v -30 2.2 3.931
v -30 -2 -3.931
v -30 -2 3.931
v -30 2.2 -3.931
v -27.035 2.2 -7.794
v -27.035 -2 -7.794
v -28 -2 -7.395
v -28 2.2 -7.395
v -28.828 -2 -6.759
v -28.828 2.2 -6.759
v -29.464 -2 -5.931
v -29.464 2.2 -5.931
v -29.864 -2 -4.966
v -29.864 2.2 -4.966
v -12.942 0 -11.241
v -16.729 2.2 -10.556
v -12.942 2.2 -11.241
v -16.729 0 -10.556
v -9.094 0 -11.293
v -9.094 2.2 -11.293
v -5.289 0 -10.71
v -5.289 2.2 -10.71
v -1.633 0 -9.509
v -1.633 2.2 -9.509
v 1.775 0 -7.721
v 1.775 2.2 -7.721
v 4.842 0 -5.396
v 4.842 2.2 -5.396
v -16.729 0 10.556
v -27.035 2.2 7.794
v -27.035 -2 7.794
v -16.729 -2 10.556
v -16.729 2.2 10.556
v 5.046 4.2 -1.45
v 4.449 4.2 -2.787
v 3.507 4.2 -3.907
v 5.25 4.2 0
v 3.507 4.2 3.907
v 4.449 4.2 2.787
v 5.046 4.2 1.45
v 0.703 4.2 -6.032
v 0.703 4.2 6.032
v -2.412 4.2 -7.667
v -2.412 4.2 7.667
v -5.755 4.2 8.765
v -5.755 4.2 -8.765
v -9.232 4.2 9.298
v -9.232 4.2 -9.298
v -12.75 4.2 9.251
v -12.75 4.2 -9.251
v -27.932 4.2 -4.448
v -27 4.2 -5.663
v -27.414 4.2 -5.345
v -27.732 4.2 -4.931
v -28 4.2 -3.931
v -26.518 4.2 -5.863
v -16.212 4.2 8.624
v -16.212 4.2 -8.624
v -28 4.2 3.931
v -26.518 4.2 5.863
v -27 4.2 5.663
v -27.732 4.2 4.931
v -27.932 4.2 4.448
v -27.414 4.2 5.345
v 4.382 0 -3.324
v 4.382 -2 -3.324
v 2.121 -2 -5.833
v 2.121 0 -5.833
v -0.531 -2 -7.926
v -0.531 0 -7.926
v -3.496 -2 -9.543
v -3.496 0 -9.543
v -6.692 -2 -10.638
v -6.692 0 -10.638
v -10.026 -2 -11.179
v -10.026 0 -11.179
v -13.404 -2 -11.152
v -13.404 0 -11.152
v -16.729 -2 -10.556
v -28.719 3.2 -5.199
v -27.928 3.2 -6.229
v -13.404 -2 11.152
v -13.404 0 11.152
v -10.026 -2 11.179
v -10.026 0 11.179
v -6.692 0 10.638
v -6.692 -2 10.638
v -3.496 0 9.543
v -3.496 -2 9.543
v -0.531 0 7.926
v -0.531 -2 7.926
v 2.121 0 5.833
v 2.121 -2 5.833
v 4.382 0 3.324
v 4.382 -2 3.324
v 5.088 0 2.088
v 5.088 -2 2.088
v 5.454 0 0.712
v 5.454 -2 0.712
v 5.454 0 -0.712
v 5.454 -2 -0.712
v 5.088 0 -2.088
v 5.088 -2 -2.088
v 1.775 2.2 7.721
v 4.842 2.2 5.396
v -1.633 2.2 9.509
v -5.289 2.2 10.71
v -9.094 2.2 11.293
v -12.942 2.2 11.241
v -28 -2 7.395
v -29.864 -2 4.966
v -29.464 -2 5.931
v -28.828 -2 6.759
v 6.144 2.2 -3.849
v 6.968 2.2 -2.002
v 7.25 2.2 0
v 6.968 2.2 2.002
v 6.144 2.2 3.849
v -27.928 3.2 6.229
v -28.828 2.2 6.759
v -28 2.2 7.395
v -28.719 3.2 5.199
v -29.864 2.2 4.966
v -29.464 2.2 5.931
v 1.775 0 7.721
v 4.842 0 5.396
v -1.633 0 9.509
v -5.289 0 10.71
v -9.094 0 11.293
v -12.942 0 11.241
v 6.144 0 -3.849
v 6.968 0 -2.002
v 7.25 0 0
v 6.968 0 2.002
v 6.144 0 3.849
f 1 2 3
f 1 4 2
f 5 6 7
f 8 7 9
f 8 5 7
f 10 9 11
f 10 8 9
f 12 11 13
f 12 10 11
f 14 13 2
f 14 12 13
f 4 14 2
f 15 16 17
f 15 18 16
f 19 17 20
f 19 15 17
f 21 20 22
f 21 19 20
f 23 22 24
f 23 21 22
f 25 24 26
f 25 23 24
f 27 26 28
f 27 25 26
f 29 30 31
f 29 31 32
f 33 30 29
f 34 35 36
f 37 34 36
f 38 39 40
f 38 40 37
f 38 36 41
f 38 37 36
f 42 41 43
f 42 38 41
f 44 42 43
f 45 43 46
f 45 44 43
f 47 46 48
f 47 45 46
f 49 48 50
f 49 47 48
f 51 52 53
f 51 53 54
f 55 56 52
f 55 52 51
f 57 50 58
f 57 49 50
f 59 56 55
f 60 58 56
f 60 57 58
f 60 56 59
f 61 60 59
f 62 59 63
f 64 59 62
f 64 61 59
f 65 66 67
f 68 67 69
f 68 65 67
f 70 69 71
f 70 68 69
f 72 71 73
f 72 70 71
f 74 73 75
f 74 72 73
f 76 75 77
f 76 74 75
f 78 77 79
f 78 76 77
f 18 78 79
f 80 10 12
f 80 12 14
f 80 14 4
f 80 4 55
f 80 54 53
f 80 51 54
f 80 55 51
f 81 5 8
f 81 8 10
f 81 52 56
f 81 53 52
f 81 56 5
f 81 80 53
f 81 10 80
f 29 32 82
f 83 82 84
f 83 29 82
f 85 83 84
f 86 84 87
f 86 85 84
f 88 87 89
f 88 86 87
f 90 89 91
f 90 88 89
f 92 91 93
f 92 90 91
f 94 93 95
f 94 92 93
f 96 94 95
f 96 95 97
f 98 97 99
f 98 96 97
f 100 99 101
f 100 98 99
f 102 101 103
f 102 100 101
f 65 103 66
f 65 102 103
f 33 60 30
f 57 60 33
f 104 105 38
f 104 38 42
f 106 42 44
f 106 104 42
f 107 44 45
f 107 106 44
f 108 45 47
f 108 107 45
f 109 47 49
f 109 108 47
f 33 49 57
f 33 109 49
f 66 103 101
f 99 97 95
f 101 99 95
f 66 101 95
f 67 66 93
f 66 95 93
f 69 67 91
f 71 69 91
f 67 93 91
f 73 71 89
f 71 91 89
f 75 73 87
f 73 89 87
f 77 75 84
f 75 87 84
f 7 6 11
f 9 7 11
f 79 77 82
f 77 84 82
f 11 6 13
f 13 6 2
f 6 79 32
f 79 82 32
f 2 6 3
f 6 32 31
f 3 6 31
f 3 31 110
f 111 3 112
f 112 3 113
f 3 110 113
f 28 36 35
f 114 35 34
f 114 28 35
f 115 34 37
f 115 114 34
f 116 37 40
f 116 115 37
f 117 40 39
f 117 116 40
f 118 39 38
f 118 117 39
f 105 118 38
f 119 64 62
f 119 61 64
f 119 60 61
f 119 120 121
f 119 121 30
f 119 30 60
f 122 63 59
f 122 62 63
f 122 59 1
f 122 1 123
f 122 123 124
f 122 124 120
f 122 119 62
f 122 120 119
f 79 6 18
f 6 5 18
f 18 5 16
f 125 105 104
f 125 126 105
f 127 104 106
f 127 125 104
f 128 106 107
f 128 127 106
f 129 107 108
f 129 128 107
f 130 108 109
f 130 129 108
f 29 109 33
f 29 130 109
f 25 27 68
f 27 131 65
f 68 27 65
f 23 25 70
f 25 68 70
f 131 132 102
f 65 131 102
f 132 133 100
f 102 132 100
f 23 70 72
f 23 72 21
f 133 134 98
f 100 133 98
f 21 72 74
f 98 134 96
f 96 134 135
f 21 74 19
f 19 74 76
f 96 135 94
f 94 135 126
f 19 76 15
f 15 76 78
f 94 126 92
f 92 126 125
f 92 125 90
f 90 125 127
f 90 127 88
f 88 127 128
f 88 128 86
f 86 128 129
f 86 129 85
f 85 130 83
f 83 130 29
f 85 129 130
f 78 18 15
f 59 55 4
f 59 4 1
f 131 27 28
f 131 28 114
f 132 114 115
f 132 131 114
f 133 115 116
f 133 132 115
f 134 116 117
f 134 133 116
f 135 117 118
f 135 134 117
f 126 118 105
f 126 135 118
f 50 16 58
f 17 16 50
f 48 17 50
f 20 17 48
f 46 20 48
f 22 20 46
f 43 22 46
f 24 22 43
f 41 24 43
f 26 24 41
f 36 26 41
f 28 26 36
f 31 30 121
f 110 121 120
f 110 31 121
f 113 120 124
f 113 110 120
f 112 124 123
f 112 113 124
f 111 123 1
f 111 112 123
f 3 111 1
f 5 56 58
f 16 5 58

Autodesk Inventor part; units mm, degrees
ref_plane "YZ Plane" through (0, 0, 0) normal (1, 0, 0) x (0, 1, 0)
ref_plane "XZ Plane" through (0, 0, 0) normal (0, 1, 0) x (-1, 0, 0)
ref_plane "XY Plane" through (0, 0, 0) normal (0, 0, 1) x (1, 0, 0)
sketch "Sketch1" plane through (0, 0, 0) normal (0, 1, 0) x (-1, 0, 0)
  circle A0 centre (0, 0) radius 5.5
  line L0 (0, 0) -> (30, 0) construction
  line L1 (30, -7) -> (30, 7)
  line L2 (30, -7) -> (16.7292, -10.5559)
  arc A1 (-4.3821, -3.3237) -> (16.7292, -10.5559) centre (11.5528, 8.7626) ccw
  line L3 (30, 7) -> (16.7292, 10.5559)
  arc A2 (16.7292, 10.5559) -> (-4.3821, 3.3237) centre (11.5528, -8.7626) ccw
  circle A3 centre (0, 0) radius 7.25
  arc A4 (16.7292, 10.5559) -> (-4.8424, 5.3957) centre (10.7046, -11.928) ccw
  arc A5 (-4.8424, -5.3957) -> (16.7292, -10.5559) centre (10.7046, 11.928) ccw
  point P0 (1.7838, 5.2027)
  point P1 (1.7838, -5.2027)
  point P2 (16.7292, 10.5559)
  point P3 (30, 9.4853)
  point P4 (30, -9.4853)
  point P5 (30, -9.4752)
  point P6 (30, 9.4752)
  dimension "d0" = 11
  dimension "d1" = 30
  dimension "d2" = 14
  dimension "d5" = 30
  dimension "d10" = 14.5
  dimension "d52" = 20
extrude "Extrusion1" add sketch "Sketch1" against normal blind 2 contours A0 | A0 A2 A3 A1 | A2 L3 L1 L2 A1 A3 picked at (6.6012, -0.5586)
extrude "Extrusion2" add sketch "Sketch1" along normal blind 4.2
fillet "Fillet1" radius 4 2 edges at (-30, 1.1, 7) (-30, 1.1, -7)
chamfer "Chamfer1" distance 2 angle 45 8 edges at (-30, 4.2, 0) (-29.1734, 4.2, 6.3657) (-21.8822, 4.2, 9.1752) (-5.2893, 4.2, 10.7104) (7.25, 4.2, 0) (-5.2893, 4.2, -10.7104) (-21.8822, 4.2, -9.1752) (-29.1734, 4.2, -6.3657)
sketch "Sketch9" plane through (0, -2, 0) normal (0, -1, 0) x (1, 0, 0)
  arc A0 (-27.0353, 7.7944) -> (-30, 3.9307) centre (-26, 3.9307) ccw projected
  line L0 (-30, 3.9307) -> (-30, -3.9307) projected
  arc A1 (-30, -3.9307) -> (-27.0353, -7.7944) centre (-26, -3.9307) ccw projected
  arc A2 (6.1782, -6.8842) -> (6.1782, 6.8842) centre (0, 0) ccw projected
  line L1 (-32, -3.9307) -> (-32, 3.9307) projected
  line L2 (-27.5363, -9.7307) -> (-33.6527, -8.0918)
  arc A3 (-36.9536, -3.79) -> (-33.6527, -8.0918) centre (-32.5, -3.79) ccw
  line L3 (-36.9536, -3.79) -> (-36.9536, 4.2596)
  arc A4 (-33.0372, 8.6806) -> (-36.9536, 4.2596) centre (-32.5, 4.2596) ccw
  line L4 (-32, 3.9307) -> (-32, -3.9307) projected
  line L5 (-26.7661, 9.4426) -> (-33.0372, 8.6806)
  arc A5 (-17.2468, -12.4878) -> (6.1782, -6.8842) centre (-10.7046, 11.928) ccw projected
  line L6 (-26.5589, -7.4525) -> (-33.0176, -5.7218)
  arc A6 (-34.5, -3.79) -> (-33.0176, -5.7218) centre (-32.5, -3.79) ccw
  line L7 (-34.5, -3.79) -> (-34.5, 4.2596)
  arc A7 (-33.0176, 6.1914) -> (-34.5, 4.2596) centre (-32.5, 4.2596) ccw
  line L8 (-33.0176, 6.1914) -> (-27.0353, 7.7944)
  arc A8 (4.3821, 3.3237) -> (-16.7292, 10.5559) centre (-11.5528, -8.7626) ccw projected
  arc A9 (-16.7292, -10.5559) -> (4.3821, -3.3237) centre (-11.5528, 8.7626) ccw projected
  arc A10 (4.3821, -3.3237) -> (4.3821, 3.3237) centre (0, 0) ccw projected
  arc A11 (4.3821, 3.3237) -> (-16.7292, 10.5559) centre (-11.5528, -8.7626) ccw projected
  line L9 (-16.7292, 10.5559) -> (-27.0353, 7.7944) projected
  line L10 (-27.0353, -7.7944) -> (-16.7292, -10.5559) projected
  arc A12 (-17.2468, -12.4878) -> (6.1782, -6.8842) centre (-10.7046, 11.928) ccw projected
  line L11 (-17.2468, -12.4878) -> (-27.5529, -9.7262) projected
  arc A13 (-32, -3.9307) -> (-27.5529, -9.7262) centre (-26, -3.9307) ccw projected
  arc A14 (-27.5529, 9.7262) -> (-32, 3.9307) centre (-26, 3.9307) ccw projected
  line L12 (-27.5529, 9.7262) -> (-17.2468, 12.4878) projected
  arc A15 (6.1782, 6.8842) -> (-17.2468, 12.4878) centre (-10.7046, -11.928) ccw projected
  line L13 (-27.5529, -9.7262) -> (-17.2468, -12.4878) projected
  line L14 (-27.0353, 7.7944) -> (-16.7292, 10.5559) projected
  point P0 (-27.5529, -9.7262)
  point P1 (-31.5927, -6.1037)
  point P2 (-31.355, 6.6369)
  point P3 (-28.9, 9.1833)
  dimension "d90" = 2.5
  dimension "d91" = 2
sketch "Sketch11" plane through (0, 6.1, 0) normal (0, 1, 0) x (1, 0, 0)
  arc A0 (4.0599, -4.5238) -> (4.0599, 4.5238) centre (0, 0) ccw projected
  line L0 (-28.8284, -3.9307) -> (-28.8284, 3.9307) projected
  line L1 (-26.7321, 6.6627) -> (-16.4259, 9.4243) projected
  arc A1 (4.0599, 4.5238) -> (-16.4259, 9.4243) centre (-10.7046, -11.928) ccw projected
  arc A2 (-16.4259, -9.4243) -> (4.0599, -4.5238) centre (-10.7046, 11.928) ccw projected
  line L2 (-16.4259, -9.4243) -> (-26.7321, -6.6627) projected
  arc A3 (-28.8284, -3.9307) -> (-26.7321, -6.6627) centre (-26, -3.9307) ccw projected
  arc A4 (-26.7321, 6.6627) -> (-28.8284, 3.9307) centre (-26, 3.9307) ccw projected
  dimension "d75" = 1
  dimension "d76" = 1
  dimension "d77" = 1
  dimension "d78" = 10
  dimension "d79" = 80
sketch "Sketch16" plane through (0, 11.1, 0) normal (0, 1, 0) x (1, 0, 0)
  point P0 (0, 0)
sketch "Sketch15" plane through (-28, 4.1, -3.9307) normal (0, -1, 0) x (1, 0, 0)
  point P0 (28, 3.9307)
  point P1 (28, 3.9307)
properties part number "FS-00-SLBV8"
